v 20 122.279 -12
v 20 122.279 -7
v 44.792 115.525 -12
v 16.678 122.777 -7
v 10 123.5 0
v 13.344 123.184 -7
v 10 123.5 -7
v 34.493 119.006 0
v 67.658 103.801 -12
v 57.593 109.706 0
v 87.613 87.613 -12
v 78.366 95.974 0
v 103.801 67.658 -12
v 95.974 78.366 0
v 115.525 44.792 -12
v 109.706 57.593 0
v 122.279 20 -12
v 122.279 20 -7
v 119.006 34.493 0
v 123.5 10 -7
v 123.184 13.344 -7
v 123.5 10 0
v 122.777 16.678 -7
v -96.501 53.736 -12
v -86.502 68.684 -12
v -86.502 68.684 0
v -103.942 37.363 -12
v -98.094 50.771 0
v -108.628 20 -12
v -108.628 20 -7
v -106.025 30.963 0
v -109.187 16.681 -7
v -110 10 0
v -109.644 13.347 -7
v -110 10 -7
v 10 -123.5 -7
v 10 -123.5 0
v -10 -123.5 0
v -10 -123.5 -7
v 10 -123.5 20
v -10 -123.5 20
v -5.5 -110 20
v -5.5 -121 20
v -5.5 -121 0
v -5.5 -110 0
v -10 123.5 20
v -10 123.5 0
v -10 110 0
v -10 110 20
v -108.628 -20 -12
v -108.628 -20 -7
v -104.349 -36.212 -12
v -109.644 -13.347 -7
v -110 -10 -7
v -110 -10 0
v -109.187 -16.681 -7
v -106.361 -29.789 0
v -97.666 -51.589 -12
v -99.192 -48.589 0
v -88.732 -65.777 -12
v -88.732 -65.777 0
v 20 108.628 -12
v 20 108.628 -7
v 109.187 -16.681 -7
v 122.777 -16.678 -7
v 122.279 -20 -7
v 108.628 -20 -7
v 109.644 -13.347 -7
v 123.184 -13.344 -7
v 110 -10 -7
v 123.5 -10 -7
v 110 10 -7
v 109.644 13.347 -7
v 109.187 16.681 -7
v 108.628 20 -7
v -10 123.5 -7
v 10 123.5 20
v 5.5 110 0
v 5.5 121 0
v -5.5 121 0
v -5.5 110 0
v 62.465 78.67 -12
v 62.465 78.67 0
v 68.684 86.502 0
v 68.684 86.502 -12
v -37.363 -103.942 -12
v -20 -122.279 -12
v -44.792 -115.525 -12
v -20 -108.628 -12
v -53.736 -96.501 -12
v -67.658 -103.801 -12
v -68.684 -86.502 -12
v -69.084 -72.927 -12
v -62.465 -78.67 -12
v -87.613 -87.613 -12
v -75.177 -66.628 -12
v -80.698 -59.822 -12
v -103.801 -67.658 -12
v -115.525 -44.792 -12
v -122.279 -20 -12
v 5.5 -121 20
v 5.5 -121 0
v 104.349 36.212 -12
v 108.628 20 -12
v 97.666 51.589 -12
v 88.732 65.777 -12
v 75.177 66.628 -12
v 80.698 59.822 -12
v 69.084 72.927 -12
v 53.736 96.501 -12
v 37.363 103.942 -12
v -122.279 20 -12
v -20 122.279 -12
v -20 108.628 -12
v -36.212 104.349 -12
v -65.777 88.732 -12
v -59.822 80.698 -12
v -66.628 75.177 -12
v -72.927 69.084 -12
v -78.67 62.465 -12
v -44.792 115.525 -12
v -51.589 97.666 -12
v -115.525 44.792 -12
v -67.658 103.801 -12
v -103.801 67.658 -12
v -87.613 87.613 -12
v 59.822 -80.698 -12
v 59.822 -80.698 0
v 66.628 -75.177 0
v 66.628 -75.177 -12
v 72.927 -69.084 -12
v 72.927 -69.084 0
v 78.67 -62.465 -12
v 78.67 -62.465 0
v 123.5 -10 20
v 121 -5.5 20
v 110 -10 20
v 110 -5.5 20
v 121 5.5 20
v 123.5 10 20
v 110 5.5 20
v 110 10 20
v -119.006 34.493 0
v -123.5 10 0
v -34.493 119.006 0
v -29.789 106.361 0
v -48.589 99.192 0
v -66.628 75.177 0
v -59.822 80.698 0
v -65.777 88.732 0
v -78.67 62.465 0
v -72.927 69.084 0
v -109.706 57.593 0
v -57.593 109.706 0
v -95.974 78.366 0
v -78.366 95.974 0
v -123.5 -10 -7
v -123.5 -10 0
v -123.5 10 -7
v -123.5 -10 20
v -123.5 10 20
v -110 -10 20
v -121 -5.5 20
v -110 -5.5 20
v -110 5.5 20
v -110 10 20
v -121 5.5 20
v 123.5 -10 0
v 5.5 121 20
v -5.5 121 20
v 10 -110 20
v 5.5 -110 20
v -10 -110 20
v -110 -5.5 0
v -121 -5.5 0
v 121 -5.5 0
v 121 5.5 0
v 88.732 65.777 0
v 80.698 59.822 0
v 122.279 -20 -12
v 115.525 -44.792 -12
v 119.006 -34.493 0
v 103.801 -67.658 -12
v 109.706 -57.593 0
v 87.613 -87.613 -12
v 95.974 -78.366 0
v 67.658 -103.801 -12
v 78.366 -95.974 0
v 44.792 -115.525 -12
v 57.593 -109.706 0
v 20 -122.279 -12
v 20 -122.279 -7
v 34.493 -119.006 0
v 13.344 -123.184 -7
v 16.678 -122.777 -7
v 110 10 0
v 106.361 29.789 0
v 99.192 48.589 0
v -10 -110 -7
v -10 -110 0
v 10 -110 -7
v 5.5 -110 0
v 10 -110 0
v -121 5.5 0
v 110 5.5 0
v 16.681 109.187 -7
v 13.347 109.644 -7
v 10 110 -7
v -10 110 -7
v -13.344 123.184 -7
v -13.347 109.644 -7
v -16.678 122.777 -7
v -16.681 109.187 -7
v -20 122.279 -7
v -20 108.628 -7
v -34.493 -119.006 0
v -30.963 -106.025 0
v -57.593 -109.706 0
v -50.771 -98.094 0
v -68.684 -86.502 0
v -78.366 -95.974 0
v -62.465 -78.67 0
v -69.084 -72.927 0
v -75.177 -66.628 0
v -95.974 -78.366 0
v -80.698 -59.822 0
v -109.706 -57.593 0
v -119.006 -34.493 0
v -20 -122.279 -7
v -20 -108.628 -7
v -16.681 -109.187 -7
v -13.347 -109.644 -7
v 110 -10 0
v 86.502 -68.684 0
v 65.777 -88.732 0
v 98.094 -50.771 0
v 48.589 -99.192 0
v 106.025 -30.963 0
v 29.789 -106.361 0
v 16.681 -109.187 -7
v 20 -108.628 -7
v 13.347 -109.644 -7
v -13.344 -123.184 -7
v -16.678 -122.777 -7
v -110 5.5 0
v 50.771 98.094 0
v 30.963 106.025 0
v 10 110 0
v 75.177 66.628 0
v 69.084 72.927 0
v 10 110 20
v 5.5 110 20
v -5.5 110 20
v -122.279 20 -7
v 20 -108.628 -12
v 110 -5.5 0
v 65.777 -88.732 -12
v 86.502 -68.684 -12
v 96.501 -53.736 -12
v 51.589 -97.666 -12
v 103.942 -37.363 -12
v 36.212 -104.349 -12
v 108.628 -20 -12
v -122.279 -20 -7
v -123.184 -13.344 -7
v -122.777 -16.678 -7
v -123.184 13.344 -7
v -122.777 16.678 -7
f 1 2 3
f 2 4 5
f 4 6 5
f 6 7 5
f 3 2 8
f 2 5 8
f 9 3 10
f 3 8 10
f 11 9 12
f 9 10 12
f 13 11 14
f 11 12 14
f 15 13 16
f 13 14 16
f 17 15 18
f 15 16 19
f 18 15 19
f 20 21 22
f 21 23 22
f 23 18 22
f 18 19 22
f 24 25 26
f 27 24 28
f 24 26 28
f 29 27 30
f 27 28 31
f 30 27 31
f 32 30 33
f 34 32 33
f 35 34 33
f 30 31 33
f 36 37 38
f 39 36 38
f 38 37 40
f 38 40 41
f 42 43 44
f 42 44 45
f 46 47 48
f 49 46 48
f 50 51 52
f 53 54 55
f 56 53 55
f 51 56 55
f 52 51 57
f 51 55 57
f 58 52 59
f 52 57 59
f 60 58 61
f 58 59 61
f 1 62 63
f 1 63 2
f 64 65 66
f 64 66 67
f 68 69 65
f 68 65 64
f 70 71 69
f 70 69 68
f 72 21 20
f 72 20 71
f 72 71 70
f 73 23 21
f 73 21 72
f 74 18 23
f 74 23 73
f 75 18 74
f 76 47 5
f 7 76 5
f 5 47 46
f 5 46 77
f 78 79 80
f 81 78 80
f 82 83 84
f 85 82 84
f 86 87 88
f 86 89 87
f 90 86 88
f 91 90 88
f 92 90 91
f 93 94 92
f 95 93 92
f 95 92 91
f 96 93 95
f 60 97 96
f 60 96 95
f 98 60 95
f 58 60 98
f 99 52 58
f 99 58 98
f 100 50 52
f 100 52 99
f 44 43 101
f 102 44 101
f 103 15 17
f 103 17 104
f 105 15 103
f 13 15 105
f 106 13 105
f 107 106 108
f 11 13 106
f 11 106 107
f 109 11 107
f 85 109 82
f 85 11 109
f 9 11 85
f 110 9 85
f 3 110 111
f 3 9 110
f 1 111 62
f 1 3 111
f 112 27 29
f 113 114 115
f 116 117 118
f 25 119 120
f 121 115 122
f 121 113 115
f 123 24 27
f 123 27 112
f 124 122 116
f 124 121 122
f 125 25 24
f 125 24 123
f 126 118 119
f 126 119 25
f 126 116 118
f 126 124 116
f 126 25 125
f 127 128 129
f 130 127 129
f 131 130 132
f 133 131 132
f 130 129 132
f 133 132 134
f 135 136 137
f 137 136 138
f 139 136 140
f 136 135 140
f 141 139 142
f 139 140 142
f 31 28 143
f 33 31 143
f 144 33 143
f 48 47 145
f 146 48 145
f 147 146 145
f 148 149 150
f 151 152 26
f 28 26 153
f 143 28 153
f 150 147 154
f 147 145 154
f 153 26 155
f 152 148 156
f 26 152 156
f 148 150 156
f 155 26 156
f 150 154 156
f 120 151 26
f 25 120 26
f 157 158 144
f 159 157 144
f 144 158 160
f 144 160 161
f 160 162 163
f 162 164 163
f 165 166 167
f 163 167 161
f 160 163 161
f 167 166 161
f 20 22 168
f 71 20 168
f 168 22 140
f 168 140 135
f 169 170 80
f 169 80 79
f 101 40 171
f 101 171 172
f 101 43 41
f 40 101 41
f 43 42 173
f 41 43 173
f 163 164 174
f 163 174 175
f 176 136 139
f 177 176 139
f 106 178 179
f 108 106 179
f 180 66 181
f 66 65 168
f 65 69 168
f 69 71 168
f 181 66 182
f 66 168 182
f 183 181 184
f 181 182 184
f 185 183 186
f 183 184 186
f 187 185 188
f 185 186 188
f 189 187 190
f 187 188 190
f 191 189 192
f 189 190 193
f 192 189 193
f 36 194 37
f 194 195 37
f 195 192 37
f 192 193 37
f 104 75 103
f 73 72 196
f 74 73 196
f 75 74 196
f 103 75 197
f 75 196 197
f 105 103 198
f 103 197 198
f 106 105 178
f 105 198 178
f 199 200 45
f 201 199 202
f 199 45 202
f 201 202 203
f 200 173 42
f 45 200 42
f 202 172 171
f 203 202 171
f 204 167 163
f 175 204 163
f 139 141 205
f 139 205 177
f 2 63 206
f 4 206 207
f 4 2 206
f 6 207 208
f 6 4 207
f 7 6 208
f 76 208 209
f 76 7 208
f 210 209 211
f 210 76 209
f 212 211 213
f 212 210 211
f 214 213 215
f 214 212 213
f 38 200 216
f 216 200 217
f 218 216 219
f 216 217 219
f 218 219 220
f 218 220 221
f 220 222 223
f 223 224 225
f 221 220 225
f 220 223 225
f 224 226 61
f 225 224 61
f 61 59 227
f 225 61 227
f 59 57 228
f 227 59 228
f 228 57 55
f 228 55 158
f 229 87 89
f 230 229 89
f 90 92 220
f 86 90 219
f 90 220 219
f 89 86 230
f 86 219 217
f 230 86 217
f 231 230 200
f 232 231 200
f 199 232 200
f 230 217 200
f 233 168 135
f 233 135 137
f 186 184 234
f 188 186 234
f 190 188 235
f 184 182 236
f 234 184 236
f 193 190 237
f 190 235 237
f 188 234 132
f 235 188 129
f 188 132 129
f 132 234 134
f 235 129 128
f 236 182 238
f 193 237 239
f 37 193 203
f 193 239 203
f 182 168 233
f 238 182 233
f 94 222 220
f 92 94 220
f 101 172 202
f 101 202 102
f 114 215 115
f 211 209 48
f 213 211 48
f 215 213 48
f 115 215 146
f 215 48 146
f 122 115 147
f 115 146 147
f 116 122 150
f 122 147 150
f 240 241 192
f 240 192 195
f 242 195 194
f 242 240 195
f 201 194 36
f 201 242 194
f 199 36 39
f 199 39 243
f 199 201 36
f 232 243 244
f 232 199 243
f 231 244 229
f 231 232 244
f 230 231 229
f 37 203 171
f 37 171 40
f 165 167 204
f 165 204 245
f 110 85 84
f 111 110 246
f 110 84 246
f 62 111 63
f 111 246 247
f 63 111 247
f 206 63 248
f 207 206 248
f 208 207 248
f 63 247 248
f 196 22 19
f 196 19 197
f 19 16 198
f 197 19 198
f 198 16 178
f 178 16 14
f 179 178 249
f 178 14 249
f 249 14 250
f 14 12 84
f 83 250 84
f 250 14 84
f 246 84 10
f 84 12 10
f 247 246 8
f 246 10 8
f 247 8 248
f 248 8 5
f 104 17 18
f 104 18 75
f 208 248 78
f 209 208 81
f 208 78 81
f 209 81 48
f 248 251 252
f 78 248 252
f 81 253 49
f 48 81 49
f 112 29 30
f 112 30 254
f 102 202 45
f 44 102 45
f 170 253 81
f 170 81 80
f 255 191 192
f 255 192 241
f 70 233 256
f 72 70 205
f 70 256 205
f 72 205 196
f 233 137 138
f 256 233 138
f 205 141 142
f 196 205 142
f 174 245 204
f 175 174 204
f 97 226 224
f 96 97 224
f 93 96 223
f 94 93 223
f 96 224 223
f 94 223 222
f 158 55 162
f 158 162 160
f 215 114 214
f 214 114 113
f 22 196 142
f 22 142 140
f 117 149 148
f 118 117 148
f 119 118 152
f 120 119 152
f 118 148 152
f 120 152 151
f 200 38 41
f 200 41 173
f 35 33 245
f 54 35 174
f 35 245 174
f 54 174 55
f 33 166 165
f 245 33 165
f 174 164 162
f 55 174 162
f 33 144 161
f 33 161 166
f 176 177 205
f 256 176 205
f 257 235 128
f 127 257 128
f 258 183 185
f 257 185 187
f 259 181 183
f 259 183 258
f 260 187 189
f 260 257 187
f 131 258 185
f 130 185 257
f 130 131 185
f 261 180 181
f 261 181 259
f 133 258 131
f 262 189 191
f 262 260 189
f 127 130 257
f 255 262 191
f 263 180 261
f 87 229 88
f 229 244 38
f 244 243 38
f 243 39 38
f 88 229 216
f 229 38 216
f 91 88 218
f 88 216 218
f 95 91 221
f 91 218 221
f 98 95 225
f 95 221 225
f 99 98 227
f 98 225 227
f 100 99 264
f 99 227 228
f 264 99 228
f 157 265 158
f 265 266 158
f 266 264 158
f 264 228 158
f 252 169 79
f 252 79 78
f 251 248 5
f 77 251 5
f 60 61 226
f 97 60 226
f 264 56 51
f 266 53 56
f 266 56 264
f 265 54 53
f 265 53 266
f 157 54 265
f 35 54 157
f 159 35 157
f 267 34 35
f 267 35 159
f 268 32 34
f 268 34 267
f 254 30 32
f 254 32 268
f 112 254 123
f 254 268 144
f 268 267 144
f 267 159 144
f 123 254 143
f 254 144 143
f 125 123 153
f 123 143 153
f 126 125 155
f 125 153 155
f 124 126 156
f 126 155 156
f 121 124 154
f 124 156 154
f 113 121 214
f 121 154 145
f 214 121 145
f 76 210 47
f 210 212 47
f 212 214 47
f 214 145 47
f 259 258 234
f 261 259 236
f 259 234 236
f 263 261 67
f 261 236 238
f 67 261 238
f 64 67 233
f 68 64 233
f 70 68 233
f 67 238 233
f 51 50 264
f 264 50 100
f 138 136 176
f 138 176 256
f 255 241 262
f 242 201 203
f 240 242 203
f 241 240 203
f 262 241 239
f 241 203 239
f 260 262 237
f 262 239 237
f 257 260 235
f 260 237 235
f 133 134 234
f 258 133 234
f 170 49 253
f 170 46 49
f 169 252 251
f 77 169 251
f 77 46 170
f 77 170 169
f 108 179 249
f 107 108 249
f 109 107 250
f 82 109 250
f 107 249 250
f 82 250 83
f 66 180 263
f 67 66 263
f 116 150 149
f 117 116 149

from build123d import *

# Parameters (mm, degrees)
BOSS_EXTRUDE1_DEPTH   = 20
BOSS_EXTRUDE1_2_DEPTH = 20
BOSS_EXTRUDE1_3_DEPTH = 20
BOSS_EXTRUDE1_4_DEPTH = 20
BOSS_EXTRUDE2_DEPTH   = 12
SKETCH5_W             = 25
SKETCH5_H             = 40
SKETCH5_W_2           = 40
SKETCH5_H_2           = 25
CUT_EXTRUDE1_DEPTH    = 5


with BuildPart() as part:
    # Sketch2 → Boss-Extrude1 (new body)
    with BuildSketch(Plane.XY):
        Polygon((110, 10), (123.5, 10), (123.5, -10), (110, -10), (110, -5.5), (114.5, -5.5), (121, -5.5), (121, 5.5), (114.5, 5.5), (110, 5.5), align=None)
    extrude(amount=BOSS_EXTRUDE1_DEPTH)



with BuildPart() as body_2:
    # Sketch2 → Boss-Extrude1 2 (new body)
    with BuildSketch(Plane.XY):
        Polygon((10, -110), (10, -123.5), (-10, -123.5), (-10, -110), (-5.5, -110), (-5.5, -114.5), (-5.5, -121), (5.5, -121), (5.5, -114.5), (5.5, -110), align=None)
    extrude(amount=BOSS_EXTRUDE1_2_DEPTH)


with BuildPart() as body_3:
    # Sketch2 → Boss-Extrude1 3 (new body)
    with BuildSketch(Plane.XY):
        Polygon((-110, -10), (-123.5, -10), (-123.5, 10), (-110, 10), (-110, 5.5), (-114.5, 5.5), (-121, 5.5), (-121, -5.5), (-114.5, -5.5), (-110, -5.5), align=None)
    extrude(amount=BOSS_EXTRUDE1_3_DEPTH)


with BuildPart() as body_4:
    # Sketch2 → Boss-Extrude1 4 (new body)
    with BuildSketch(Plane.XY):
        Polygon((-10, 110), (-5.5, 110), (-5.5, 114.5), (-5.5, 121), (5.5, 121), (5.5, 114.5), (5.5, 110), (10, 110), (10, 123.5), (-10, 123.5), align=None)
    extrude(amount=BOSS_EXTRUDE1_4_DEPTH)


with BuildPart() as part_1:
    add(part.part)

    add(body_2.part)  # Boss-Extrude2 merges body 2

    add(body_3.part)  # Boss-Extrude2 merges body 3

    add(body_4.part)  # Boss-Extrude2 merges body 4
    # Sketch3 → Boss-Extrude2 (add)
    with BuildSketch(Plane(origin=(0, 0, 0), x_dir=(-1, 0, 0), z_dir=(0, 0, -1))):
        with BuildLine():
            Line((10, 123.5), (-10, 123.5))
            ThreePointArc((-10, 123.5), (-87.613497819, 87.613497819), (-123.5, 10))
            Line((-123.5, 10), (-123.5, -10))
            ThreePointArc((-123.5, -10), (-87.613497819, -87.613497819), (-10, -123.5))
            Line((-10, -123.5), (10, -123.5))
            ThreePointArc((10, -123.5), (87.613497819, -87.613497819), (123.5, -10))
            Line((123.5, -10), (123.5, 10))
            ThreePointArc((123.5, 10), (87.613497819, 87.613497819), (10, 123.5))
        make_face()
        with BuildLine():
            ThreePointArc((-110, 10), (-103.205416168, 39.352789909), (-88.731734836, 65.777497923))
            Line((-88.731734836, 65.777497923), (-80.698341025, 59.822283075))
            ThreePointArc((-80.698341025, 59.822283075), (-72.199580711, 69.843742323), (-62.465465553, 78.670155776))
            Line((-62.465465553, 78.670155776), (-68.683805088, 86.501646913))
            ThreePointArc((-68.683805088, 86.501646913), (-41.058841255, 102.538634449), (-10, 110))
            Line((-10, 110), (10, 110))
            ThreePointArc((10, 110), (39.352789909, 103.205416168), (65.777497923, 88.731734836))
            Line((65.777497923, 88.731734836), (59.822283075, 80.698341025))
            ThreePointArc((59.822283075, 80.698341025), (69.843742323, 72.199580711), (78.670155776, 62.465465553))
            Line((78.670155776, 62.465465553), (86.501646913, 68.683805088))
            ThreePointArc((86.501646913, 68.683805088), (102.538634449, 41.058841255), (110, 10))
            Line((110, 10), (110, -10))
            ThreePointArc((110, -10), (103.205416168, -39.352789909), (88.731734836, -65.777497923))
            Line((88.731734836, -65.777497923), (80.698341025, -59.822283075))
            ThreePointArc((80.698341025, -59.822283075), (72.199580711, -69.843742323), (62.465465553, -78.670155776))
            Line((62.465465553, -78.670155776), (68.683805088, -86.501646913))
            ThreePointArc((68.683805088, -86.501646913), (41.058841255, -102.538634449), (10, -110))
            Line((10, -110), (-10, -110))
            ThreePointArc((-10, -110), (-39.352789909, -103.205416168), (-65.777497923, -88.731734836))
            Line((-65.777497923, -88.731734836), (-59.822283075, -80.698341025))
            ThreePointArc((-59.822283075, -80.698341025), (-69.843742323, -72.199580711), (-78.670155776, -62.465465553))
            Line((-78.670155776, -62.465465553), (-86.501646913, -68.683805088))
            ThreePointArc((-86.501646913, -68.683805088), (-102.538634449, -41.058841255), (-110, -10))
            Line((-110, -10), (-110, -5.5))
            Line((-110, -5.5), (-110, 5.5))
            Line((-110, 5.5), (-110, 10))
        make_face(mode=Mode.SUBTRACT)
    extrude(amount=BOSS_EXTRUDE2_DEPTH)

    # Sketch5 → Cut-Extrude1 (cut)
    with BuildSketch(Plane(origin=(0, 0, -12), x_dir=(-1, 0, 0), z_dir=(0, 0, -1))):
        with Locations((-116.75, 0)):
            Rectangle(SKETCH5_W, SKETCH5_H)
        with Locations((0, 116.75)):
            Rectangle(SKETCH5_W_2, SKETCH5_H_2)
        with Locations((116.75, 0)):
            Rectangle(SKETCH5_W, SKETCH5_H)
        with Locations((0, -116.75)):
            Rectangle(SKETCH5_W_2, SKETCH5_H_2)
    extrude(amount=-CUT_EXTRUDE1_DEPTH, mode=Mode.SUBTRACT)


solid = part_1.part
